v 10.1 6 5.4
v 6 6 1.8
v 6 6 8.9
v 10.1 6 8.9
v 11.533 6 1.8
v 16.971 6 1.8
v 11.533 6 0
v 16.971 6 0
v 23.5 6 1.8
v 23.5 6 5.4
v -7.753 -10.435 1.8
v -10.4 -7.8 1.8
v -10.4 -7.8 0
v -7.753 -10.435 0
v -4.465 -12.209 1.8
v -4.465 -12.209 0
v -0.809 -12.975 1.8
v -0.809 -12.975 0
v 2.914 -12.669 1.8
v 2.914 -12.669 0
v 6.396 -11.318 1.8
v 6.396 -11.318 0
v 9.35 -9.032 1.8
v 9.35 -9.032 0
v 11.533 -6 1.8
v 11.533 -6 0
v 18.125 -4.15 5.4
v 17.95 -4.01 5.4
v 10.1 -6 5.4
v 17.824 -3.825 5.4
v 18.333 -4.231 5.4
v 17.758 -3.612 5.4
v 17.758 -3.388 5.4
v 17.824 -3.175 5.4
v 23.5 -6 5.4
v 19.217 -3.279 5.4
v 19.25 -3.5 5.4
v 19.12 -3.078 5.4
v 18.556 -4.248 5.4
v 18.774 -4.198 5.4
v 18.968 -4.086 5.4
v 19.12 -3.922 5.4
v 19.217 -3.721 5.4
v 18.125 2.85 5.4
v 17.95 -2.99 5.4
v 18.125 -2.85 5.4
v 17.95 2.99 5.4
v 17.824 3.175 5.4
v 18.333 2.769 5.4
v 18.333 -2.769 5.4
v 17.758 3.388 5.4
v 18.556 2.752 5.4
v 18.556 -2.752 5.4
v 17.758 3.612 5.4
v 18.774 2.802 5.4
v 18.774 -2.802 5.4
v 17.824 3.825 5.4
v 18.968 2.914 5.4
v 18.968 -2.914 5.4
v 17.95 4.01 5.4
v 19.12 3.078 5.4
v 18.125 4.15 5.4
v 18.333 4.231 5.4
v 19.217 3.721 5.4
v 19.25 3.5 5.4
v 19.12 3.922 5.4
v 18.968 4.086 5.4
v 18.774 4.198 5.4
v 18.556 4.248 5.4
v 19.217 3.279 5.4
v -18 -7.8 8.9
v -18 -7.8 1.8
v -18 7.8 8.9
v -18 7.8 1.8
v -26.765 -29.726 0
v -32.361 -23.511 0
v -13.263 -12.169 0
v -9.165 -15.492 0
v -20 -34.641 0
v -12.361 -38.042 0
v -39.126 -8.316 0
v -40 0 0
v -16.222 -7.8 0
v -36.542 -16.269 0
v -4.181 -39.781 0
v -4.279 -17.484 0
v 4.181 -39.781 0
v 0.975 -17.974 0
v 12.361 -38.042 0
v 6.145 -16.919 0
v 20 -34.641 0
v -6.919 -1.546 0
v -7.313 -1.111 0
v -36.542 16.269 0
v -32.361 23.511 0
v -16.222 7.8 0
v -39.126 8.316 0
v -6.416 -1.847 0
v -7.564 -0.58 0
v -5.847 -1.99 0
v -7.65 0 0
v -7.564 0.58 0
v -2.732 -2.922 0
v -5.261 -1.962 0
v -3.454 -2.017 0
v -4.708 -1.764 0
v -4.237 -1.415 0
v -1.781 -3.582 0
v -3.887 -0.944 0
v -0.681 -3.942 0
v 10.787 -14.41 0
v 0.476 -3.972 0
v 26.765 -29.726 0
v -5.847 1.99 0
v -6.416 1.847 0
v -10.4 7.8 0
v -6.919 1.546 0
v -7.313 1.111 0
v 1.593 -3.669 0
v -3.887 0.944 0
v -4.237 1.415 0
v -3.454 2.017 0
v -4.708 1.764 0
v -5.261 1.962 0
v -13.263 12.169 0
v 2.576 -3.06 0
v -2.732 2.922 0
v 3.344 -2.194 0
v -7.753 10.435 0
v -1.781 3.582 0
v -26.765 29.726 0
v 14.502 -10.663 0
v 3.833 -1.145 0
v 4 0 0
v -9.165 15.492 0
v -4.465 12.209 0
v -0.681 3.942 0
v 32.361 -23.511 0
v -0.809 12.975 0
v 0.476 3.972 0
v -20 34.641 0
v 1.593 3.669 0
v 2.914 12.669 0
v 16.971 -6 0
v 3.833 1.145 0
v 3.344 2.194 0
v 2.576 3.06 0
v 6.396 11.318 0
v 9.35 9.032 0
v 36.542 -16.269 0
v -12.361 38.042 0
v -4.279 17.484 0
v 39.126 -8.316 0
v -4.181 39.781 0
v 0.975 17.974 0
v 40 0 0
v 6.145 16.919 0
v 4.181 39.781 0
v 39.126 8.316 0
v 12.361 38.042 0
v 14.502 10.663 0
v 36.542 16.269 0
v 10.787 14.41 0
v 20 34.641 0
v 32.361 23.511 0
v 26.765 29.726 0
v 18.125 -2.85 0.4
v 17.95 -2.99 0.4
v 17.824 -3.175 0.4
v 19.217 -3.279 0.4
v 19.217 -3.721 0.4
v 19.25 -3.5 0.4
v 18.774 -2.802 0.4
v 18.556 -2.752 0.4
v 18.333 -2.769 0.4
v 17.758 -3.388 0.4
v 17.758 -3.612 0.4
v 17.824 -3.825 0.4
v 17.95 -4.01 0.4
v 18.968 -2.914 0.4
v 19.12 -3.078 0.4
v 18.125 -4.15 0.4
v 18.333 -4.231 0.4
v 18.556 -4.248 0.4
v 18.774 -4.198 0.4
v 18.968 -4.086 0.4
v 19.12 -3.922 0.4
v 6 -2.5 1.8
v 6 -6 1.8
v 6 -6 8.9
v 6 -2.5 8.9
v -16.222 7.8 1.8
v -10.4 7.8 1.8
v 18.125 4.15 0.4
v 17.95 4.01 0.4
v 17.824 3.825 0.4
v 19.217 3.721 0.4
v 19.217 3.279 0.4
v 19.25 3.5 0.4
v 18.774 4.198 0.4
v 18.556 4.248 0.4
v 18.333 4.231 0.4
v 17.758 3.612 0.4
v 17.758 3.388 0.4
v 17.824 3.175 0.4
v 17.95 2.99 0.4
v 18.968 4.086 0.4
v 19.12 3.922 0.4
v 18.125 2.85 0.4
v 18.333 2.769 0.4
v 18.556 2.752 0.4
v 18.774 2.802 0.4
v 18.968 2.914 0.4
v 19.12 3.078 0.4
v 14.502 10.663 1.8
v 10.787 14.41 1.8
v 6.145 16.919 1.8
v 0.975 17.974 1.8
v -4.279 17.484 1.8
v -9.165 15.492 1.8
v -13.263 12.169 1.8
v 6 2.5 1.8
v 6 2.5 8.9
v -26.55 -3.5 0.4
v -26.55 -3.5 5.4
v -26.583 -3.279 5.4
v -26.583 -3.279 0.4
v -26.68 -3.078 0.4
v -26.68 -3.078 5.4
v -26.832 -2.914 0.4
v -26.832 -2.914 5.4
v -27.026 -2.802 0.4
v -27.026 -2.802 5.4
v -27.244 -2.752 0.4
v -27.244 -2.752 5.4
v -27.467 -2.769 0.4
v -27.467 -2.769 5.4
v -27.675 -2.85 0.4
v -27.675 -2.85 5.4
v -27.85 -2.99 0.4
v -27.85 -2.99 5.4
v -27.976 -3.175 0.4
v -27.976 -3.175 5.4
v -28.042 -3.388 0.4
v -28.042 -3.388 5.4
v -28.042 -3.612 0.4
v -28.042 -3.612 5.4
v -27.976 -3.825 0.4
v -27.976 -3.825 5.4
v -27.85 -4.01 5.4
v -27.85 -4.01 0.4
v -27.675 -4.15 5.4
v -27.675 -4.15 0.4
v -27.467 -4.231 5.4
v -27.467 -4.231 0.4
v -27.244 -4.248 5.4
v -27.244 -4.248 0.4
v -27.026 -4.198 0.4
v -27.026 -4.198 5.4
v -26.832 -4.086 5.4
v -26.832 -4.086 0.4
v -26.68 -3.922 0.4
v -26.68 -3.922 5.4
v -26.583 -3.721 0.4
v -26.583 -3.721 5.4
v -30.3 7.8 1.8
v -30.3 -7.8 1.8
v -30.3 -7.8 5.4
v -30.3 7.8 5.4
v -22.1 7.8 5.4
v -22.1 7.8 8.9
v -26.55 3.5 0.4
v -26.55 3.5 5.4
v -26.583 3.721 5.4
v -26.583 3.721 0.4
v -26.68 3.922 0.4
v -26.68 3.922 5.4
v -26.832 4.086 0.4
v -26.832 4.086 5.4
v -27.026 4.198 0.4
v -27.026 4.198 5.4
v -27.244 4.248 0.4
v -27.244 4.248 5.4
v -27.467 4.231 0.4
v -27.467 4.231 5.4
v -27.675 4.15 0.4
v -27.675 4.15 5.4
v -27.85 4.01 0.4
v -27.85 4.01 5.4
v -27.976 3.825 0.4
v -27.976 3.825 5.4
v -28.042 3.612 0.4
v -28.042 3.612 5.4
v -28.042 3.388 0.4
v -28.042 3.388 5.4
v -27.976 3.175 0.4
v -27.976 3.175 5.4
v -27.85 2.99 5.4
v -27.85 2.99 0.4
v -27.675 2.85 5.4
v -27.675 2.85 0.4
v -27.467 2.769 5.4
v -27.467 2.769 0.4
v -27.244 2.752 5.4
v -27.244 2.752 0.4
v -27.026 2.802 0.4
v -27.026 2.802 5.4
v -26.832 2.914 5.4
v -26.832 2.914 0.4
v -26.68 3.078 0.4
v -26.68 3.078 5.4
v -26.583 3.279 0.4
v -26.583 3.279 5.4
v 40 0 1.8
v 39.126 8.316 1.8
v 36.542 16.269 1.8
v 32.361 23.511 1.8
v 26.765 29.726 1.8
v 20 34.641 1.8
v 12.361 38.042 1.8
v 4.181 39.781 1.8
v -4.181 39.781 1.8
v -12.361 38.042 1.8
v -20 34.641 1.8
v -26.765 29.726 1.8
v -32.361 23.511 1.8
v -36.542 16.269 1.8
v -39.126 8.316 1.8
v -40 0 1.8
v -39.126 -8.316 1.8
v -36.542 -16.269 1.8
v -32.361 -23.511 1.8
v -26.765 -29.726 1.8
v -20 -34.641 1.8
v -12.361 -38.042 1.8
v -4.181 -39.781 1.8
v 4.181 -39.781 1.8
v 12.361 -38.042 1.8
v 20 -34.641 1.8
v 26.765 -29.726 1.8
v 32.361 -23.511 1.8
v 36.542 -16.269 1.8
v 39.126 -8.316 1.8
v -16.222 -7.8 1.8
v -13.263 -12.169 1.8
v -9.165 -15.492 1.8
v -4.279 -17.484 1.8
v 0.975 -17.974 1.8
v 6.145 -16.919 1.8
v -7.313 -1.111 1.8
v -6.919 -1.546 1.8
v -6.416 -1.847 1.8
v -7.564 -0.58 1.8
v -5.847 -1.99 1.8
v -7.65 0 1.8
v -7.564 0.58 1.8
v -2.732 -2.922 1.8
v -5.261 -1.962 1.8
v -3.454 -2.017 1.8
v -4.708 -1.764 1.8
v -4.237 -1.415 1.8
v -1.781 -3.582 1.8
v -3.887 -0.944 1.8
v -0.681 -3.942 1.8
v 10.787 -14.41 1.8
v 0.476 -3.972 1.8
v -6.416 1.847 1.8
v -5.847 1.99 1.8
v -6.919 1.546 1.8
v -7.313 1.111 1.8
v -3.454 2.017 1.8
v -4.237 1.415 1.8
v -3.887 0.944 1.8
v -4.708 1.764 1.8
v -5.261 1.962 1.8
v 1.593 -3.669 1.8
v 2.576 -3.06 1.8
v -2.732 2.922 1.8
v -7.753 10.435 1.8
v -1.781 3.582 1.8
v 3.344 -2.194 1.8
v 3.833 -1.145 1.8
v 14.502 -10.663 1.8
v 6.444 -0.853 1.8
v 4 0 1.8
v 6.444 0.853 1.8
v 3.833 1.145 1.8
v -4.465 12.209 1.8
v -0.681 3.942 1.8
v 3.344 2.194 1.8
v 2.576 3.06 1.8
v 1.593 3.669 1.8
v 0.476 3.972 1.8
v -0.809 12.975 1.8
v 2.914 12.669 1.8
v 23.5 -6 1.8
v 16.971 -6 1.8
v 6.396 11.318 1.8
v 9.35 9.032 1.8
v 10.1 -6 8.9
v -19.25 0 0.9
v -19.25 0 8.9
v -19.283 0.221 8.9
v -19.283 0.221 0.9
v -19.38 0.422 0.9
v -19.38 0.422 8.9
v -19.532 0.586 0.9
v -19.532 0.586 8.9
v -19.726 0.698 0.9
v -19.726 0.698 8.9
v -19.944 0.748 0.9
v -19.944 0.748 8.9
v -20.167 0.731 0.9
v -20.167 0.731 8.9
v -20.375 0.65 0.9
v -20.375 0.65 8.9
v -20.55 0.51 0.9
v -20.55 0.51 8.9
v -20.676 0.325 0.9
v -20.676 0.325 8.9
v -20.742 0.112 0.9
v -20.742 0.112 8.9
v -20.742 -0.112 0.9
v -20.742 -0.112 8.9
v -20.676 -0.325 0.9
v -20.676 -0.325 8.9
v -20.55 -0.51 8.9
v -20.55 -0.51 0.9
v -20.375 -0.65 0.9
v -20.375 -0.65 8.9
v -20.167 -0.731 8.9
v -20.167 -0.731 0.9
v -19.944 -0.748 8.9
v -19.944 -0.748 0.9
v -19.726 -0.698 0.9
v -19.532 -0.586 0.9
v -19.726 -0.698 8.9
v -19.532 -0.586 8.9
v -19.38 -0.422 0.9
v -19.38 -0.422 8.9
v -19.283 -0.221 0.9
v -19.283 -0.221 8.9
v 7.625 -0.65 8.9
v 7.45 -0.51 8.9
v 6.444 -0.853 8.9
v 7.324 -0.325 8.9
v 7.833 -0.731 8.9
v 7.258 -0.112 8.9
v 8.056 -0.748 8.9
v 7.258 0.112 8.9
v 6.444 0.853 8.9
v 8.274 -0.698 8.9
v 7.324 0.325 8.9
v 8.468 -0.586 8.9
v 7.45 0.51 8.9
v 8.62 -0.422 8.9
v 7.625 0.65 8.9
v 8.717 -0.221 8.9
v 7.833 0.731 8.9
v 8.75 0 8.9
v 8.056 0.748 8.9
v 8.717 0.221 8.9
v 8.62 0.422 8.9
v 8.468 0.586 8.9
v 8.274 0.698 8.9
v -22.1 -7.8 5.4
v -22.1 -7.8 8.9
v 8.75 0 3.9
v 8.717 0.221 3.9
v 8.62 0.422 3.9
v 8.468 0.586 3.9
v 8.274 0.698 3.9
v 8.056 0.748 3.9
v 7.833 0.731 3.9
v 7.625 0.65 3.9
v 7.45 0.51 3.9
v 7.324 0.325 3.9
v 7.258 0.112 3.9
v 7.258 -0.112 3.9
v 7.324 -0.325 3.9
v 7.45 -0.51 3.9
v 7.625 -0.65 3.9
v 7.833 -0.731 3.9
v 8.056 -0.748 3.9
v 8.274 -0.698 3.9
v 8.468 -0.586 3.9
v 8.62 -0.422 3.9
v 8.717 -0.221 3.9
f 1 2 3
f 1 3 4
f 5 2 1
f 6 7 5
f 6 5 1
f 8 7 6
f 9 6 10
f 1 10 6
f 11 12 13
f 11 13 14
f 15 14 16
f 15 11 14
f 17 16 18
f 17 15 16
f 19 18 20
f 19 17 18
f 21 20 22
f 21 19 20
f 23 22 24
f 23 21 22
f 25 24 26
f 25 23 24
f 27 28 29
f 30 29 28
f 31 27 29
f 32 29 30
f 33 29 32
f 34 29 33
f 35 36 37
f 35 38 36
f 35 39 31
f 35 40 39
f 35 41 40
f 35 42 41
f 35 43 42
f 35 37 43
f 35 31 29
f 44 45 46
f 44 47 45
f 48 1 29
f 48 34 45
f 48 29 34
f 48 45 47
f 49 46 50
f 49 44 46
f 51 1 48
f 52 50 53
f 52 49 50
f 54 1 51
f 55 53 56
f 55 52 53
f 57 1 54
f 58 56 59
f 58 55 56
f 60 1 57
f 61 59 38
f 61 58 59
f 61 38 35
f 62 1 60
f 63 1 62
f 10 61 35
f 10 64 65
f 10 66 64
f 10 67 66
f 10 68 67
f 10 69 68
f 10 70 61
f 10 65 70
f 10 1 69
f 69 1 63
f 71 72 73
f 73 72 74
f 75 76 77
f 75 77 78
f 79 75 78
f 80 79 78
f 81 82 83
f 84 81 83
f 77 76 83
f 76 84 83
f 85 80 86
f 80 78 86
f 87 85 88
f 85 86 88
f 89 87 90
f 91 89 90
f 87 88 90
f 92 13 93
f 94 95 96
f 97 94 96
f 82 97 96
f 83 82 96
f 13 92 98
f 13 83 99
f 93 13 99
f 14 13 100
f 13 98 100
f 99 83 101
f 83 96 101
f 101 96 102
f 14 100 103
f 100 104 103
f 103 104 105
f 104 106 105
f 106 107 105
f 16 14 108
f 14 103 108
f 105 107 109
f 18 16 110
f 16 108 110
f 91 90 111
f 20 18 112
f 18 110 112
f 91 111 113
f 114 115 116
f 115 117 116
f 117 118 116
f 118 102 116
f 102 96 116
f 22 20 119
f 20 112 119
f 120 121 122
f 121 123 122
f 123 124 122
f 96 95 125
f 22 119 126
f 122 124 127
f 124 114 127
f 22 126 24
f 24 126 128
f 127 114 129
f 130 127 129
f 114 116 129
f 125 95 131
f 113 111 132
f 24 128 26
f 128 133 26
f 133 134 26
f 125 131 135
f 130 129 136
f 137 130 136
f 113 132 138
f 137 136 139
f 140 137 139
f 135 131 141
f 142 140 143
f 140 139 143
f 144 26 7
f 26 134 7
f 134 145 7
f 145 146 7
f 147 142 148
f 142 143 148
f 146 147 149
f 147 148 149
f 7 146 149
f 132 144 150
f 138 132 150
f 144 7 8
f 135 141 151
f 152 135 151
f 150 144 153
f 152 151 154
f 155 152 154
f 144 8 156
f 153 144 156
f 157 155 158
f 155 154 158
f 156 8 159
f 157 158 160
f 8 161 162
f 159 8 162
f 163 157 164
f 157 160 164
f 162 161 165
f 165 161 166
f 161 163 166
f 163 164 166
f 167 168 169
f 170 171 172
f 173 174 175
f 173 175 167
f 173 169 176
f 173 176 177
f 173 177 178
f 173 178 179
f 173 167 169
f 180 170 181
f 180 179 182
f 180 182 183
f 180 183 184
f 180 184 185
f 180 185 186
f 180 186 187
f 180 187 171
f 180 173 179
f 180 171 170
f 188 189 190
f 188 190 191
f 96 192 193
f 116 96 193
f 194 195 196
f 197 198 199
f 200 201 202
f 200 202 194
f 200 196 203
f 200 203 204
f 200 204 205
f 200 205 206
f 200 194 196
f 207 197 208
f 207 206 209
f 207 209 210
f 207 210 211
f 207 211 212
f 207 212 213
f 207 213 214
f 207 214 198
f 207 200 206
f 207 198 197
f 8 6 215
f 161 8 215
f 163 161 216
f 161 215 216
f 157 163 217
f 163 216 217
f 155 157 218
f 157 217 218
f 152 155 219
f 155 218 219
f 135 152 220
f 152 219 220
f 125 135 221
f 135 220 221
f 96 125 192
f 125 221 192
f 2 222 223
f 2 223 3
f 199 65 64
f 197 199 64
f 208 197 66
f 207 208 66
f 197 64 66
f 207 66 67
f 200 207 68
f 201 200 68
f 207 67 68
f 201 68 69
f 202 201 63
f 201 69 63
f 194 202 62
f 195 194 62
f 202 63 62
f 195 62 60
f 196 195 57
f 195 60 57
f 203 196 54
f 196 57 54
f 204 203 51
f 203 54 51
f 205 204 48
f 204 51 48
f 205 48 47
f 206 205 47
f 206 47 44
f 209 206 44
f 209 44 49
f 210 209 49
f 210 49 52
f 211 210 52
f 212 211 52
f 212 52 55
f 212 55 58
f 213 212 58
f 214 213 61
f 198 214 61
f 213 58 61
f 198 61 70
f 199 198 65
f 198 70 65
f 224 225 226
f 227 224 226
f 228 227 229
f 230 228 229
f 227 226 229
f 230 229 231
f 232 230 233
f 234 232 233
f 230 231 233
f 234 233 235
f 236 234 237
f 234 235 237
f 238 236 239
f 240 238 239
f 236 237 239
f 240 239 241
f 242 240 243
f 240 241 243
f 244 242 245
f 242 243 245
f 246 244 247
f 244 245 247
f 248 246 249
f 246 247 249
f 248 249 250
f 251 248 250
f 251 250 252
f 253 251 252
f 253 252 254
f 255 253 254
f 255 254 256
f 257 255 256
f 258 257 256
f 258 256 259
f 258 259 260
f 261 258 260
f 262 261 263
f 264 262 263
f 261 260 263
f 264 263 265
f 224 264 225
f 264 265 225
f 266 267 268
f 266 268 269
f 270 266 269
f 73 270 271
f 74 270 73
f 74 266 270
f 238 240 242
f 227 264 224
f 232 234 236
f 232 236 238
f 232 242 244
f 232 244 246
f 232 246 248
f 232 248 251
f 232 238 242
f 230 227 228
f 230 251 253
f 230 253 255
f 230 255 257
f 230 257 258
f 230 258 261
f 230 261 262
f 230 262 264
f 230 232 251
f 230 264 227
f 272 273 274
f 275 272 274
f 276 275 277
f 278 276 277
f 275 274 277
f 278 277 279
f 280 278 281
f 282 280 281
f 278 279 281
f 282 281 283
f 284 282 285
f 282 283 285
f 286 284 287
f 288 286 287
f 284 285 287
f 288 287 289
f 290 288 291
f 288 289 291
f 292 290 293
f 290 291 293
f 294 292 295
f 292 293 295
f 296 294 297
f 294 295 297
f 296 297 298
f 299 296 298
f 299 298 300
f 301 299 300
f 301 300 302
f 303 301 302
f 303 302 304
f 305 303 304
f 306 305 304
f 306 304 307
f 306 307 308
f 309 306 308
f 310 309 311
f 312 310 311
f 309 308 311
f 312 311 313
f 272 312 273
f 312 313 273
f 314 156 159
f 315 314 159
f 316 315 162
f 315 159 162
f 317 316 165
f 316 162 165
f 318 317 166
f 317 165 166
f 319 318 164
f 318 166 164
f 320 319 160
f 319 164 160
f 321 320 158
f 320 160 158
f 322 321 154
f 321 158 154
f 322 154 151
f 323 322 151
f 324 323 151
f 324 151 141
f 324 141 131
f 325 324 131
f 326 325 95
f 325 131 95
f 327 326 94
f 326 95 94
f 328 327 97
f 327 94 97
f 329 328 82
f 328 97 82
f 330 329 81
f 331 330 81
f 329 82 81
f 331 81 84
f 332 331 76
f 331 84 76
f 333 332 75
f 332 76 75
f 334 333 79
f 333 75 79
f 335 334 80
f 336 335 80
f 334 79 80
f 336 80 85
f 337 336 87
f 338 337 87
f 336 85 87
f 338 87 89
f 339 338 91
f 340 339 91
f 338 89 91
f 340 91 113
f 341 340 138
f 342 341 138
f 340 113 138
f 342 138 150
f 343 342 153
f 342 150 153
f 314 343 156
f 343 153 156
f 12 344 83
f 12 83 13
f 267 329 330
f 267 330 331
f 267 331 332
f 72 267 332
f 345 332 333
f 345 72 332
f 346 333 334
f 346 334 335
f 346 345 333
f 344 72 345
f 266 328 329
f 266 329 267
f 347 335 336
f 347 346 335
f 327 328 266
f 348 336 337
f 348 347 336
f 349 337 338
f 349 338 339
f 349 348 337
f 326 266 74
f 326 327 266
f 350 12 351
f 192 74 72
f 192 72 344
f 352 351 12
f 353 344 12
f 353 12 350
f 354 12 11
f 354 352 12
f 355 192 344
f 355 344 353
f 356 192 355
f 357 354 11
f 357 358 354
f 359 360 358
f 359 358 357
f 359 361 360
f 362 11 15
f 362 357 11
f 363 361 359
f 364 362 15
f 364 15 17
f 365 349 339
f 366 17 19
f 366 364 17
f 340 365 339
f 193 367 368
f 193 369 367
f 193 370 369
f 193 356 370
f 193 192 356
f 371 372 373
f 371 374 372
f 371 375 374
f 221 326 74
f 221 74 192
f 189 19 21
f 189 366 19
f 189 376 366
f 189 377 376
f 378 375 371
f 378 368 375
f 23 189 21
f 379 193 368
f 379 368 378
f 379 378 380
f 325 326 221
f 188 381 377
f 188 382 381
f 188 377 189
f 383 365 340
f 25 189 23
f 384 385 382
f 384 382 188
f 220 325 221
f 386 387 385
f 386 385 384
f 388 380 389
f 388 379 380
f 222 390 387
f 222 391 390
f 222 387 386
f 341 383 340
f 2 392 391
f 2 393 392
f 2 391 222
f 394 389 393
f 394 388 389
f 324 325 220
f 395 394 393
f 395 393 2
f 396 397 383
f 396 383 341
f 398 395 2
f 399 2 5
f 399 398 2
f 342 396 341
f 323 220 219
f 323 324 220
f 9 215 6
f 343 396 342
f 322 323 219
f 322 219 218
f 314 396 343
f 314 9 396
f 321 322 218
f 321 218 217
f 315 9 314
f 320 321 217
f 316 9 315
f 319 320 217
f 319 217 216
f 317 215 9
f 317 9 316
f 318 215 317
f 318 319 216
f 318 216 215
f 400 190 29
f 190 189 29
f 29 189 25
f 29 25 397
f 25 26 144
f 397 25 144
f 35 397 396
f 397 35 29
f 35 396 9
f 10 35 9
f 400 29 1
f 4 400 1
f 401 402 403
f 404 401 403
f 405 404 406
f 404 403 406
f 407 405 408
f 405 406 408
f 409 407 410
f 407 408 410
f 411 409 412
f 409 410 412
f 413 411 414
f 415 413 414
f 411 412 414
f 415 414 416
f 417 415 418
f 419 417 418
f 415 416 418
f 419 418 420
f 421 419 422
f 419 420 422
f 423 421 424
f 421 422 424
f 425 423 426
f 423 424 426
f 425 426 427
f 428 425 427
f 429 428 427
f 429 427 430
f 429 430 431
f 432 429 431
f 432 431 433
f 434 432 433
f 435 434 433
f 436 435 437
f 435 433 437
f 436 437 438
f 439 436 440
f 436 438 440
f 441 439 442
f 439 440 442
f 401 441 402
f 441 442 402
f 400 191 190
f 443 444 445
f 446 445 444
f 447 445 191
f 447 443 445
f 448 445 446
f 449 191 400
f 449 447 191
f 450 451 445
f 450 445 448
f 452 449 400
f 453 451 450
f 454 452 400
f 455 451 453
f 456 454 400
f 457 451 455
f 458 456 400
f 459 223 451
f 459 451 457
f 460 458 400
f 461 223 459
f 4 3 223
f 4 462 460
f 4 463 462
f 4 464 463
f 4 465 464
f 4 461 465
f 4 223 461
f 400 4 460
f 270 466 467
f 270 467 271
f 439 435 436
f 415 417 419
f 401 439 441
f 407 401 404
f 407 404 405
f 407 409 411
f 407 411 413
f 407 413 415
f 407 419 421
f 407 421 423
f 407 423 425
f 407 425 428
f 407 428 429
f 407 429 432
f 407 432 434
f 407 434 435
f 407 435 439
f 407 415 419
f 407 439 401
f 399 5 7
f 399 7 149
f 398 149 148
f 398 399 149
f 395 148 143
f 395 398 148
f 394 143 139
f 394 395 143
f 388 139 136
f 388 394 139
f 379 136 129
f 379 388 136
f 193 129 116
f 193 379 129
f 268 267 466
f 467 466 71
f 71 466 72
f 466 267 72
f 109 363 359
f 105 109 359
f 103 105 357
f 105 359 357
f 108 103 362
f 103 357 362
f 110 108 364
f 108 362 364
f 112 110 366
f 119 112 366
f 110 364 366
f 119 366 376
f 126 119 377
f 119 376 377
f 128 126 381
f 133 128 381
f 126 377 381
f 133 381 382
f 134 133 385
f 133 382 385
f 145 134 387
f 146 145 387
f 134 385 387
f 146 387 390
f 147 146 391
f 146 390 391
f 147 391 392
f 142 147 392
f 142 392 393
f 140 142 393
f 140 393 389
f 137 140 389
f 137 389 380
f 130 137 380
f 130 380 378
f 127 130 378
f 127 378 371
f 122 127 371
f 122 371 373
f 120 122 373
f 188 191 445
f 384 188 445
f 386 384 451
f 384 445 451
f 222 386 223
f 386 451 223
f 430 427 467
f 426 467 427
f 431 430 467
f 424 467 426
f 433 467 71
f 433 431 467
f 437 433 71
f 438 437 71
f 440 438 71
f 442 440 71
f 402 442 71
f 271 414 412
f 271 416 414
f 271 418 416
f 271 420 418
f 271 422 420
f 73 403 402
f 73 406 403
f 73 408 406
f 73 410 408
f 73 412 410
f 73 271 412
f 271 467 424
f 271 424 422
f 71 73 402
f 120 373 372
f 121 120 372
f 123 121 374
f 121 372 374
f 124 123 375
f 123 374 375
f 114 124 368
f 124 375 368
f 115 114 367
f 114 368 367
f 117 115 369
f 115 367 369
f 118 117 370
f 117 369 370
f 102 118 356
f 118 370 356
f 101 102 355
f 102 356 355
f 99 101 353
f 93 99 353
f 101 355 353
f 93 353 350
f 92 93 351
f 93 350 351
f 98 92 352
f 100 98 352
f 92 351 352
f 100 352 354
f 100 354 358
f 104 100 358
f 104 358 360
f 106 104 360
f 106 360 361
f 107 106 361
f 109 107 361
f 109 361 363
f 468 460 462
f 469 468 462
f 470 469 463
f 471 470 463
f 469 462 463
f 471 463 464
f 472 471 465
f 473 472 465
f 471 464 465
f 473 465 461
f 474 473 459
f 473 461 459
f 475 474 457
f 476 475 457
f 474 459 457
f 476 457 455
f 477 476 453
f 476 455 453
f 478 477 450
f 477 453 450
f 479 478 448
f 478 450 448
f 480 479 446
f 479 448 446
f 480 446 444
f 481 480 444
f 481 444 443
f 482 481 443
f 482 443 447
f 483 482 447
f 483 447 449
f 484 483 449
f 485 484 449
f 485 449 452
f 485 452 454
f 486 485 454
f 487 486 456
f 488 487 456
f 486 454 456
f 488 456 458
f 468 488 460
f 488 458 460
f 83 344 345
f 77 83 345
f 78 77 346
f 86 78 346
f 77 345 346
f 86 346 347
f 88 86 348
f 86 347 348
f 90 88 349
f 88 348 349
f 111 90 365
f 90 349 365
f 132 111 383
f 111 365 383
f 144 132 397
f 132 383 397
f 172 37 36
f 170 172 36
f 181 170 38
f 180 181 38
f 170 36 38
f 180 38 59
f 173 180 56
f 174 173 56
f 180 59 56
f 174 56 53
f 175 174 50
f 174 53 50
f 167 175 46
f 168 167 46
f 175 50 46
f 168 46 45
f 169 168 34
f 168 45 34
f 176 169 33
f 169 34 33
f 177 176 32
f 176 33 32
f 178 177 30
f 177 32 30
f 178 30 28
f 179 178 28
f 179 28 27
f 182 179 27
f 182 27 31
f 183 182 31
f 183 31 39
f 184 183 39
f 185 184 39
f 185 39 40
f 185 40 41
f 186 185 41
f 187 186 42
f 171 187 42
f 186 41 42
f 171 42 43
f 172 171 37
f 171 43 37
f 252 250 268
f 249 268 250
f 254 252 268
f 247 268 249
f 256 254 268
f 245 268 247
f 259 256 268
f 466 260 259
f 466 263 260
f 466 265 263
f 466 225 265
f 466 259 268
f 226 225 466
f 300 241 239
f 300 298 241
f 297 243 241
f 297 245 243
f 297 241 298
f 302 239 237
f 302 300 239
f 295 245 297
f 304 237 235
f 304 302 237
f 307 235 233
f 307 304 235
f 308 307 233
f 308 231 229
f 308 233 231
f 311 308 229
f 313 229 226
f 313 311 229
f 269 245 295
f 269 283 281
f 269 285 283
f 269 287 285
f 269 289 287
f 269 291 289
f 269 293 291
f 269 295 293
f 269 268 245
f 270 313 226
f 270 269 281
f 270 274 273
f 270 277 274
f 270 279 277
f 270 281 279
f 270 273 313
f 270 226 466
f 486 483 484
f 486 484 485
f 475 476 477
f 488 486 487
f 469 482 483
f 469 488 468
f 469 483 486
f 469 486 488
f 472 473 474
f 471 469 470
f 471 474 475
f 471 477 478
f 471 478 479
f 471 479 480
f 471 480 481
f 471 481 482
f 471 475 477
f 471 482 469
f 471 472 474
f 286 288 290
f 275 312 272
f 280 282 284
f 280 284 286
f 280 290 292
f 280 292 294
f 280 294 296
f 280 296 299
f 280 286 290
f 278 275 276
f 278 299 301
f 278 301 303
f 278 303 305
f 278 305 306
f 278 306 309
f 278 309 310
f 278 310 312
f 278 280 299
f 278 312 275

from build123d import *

# Parameters (mm, degrees)
SKETCH_R        = 40
PAD_DEPTH       = 1.8
POCKET_DEPTH    = 1.801
SKETCH002_W     = 17.5
SKETCH002_H     = 12
SKETCH002_W_2   = 12.3
SKETCH002_H_2   = 15.6
PAD001_DEPTH    = 3.6
SKETCH003_W     = 4.1
SKETCH003_H     = 12
PAD002_DEPTH    = 3.5
POCKET001_DEPTH = 7.1
SKETCH005_R     = 0.75
POCKET002_DEPTH = 5
SKETCH006_R     = 0.75
POCKET003_DEPTH = 5
SKETCH007_W     = 4.1
SKETCH007_H     = 15.6
PAD003_DEPTH    = 3.5
SKETCH008_R     = 0.75
POCKET004_DEPTH = 8
POCKET005_DEPTH = 1.801


with BuildPart() as part:
    # Sketch → Pad (new body)
    with BuildSketch(Plane.XY):
        Circle(SKETCH_R)
    extrude(amount=PAD_DEPTH)

    # Sketch001 → Pocket (cut, through all)
    with BuildSketch(Plane.XY.offset(1.8)):
        with BuildLine():
            ThreePointArc((-3.886947, -0.944269), (4, 0), (-3.886947, 0.944269))
            ThreePointArc((-3.886947, 0.944269), (-7.65, 0), (-3.886947, -0.944269))
        make_face()
    extrude(amount=-POCKET_DEPTH, mode=Mode.SUBTRACT)

    # Sketch002 → Pad001 (new body)
    with BuildSketch(Plane.XY.offset(1.8)):
        with Locations((14.75, 0)):
            Rectangle(SKETCH002_W, SKETCH002_H)
        with Locations((-24.15, 0)):
            Rectangle(SKETCH002_W_2, SKETCH002_H_2)
    extrude(amount=PAD001_DEPTH)

    # Sketch003 → Pad002 (new body)
    with BuildSketch(Plane.XY.offset(5.4)):
        with Locations((8.05, 0)):
            Rectangle(SKETCH003_W, SKETCH003_H)
    extrude(amount=PAD002_DEPTH)

    # Sketch004 → Pocket001 (cut)
    with BuildSketch(Plane.XY.offset(8.9)):
        with BuildLine():
            ThreePointArc((6, -2.5), (6.5, 0), (6, 2.5))
            Line((6, 2.5), (6, -2.5))
        make_face()
    extrude(amount=-POCKET001_DEPTH, mode=Mode.SUBTRACT)

    # Sketch005 → Pocket002 (cut)
    with BuildSketch(Plane.XY.offset(5.4)):
        with Locations((-27.3, 3.5)):
            Circle(SKETCH005_R)
        with Locations((-27.3, -3.5)):
            Circle(SKETCH005_R)
        with Locations((18.5, 3.5)):
            Circle(SKETCH005_R)
        with Locations((18.5, -3.5)):
            Circle(SKETCH005_R)
    extrude(amount=-POCKET002_DEPTH, mode=Mode.SUBTRACT)

    # Sketch006 → Pocket003 (cut)
    with BuildSketch(Plane.XY.offset(8.9)):
        with Locations((8, 0)):
            Circle(SKETCH006_R)
    extrude(amount=-POCKET003_DEPTH, mode=Mode.SUBTRACT)

    # Sketch007 → Pad003 (new body)
    with BuildSketch(Plane.XY.offset(5.4)):
        with Locations((-20.05, 0)):
            Rectangle(SKETCH007_W, SKETCH007_H)
    extrude(amount=PAD003_DEPTH)

    # Sketch008 → Pocket004 (cut)
    with BuildSketch(Plane.XY.offset(8.9)):
        with Locations((-20, 0)):
            Circle(SKETCH008_R)
    extrude(amount=-POCKET004_DEPTH, mode=Mode.SUBTRACT)

    # Sketch009 → Pocket005 (cut, through all)
    with BuildSketch(Plane.XY.offset(1.8)):
        with BuildLine():
            ThreePointArc((16.970563, 6), (0.974684, 17.973591), (-16.222207, 7.8))
            Line((-16.222207, 7.8), (-10.4, 7.8))
            ThreePointArc((11.532563, 6), (1.063332, 12.95644), (-10.4, 7.8))
            Line((11.532563, 6), (16.970563, 6))
        make_face()
        with BuildLine():
            ThreePointArc((-10.4, -7.8), (1.063332, -12.95644), (11.532563, -6))
            Line((11.532563, -6), (16.970563, -6))
            ThreePointArc((-16.222207, -7.8), (0.974684, -17.973591), (16.970563, -6))
            Line((-16.222207, -7.8), (-10.4, -7.8))
        make_face()
    extrude(amount=-POCKET005_DEPTH, mode=Mode.SUBTRACT)


solid = part.part
